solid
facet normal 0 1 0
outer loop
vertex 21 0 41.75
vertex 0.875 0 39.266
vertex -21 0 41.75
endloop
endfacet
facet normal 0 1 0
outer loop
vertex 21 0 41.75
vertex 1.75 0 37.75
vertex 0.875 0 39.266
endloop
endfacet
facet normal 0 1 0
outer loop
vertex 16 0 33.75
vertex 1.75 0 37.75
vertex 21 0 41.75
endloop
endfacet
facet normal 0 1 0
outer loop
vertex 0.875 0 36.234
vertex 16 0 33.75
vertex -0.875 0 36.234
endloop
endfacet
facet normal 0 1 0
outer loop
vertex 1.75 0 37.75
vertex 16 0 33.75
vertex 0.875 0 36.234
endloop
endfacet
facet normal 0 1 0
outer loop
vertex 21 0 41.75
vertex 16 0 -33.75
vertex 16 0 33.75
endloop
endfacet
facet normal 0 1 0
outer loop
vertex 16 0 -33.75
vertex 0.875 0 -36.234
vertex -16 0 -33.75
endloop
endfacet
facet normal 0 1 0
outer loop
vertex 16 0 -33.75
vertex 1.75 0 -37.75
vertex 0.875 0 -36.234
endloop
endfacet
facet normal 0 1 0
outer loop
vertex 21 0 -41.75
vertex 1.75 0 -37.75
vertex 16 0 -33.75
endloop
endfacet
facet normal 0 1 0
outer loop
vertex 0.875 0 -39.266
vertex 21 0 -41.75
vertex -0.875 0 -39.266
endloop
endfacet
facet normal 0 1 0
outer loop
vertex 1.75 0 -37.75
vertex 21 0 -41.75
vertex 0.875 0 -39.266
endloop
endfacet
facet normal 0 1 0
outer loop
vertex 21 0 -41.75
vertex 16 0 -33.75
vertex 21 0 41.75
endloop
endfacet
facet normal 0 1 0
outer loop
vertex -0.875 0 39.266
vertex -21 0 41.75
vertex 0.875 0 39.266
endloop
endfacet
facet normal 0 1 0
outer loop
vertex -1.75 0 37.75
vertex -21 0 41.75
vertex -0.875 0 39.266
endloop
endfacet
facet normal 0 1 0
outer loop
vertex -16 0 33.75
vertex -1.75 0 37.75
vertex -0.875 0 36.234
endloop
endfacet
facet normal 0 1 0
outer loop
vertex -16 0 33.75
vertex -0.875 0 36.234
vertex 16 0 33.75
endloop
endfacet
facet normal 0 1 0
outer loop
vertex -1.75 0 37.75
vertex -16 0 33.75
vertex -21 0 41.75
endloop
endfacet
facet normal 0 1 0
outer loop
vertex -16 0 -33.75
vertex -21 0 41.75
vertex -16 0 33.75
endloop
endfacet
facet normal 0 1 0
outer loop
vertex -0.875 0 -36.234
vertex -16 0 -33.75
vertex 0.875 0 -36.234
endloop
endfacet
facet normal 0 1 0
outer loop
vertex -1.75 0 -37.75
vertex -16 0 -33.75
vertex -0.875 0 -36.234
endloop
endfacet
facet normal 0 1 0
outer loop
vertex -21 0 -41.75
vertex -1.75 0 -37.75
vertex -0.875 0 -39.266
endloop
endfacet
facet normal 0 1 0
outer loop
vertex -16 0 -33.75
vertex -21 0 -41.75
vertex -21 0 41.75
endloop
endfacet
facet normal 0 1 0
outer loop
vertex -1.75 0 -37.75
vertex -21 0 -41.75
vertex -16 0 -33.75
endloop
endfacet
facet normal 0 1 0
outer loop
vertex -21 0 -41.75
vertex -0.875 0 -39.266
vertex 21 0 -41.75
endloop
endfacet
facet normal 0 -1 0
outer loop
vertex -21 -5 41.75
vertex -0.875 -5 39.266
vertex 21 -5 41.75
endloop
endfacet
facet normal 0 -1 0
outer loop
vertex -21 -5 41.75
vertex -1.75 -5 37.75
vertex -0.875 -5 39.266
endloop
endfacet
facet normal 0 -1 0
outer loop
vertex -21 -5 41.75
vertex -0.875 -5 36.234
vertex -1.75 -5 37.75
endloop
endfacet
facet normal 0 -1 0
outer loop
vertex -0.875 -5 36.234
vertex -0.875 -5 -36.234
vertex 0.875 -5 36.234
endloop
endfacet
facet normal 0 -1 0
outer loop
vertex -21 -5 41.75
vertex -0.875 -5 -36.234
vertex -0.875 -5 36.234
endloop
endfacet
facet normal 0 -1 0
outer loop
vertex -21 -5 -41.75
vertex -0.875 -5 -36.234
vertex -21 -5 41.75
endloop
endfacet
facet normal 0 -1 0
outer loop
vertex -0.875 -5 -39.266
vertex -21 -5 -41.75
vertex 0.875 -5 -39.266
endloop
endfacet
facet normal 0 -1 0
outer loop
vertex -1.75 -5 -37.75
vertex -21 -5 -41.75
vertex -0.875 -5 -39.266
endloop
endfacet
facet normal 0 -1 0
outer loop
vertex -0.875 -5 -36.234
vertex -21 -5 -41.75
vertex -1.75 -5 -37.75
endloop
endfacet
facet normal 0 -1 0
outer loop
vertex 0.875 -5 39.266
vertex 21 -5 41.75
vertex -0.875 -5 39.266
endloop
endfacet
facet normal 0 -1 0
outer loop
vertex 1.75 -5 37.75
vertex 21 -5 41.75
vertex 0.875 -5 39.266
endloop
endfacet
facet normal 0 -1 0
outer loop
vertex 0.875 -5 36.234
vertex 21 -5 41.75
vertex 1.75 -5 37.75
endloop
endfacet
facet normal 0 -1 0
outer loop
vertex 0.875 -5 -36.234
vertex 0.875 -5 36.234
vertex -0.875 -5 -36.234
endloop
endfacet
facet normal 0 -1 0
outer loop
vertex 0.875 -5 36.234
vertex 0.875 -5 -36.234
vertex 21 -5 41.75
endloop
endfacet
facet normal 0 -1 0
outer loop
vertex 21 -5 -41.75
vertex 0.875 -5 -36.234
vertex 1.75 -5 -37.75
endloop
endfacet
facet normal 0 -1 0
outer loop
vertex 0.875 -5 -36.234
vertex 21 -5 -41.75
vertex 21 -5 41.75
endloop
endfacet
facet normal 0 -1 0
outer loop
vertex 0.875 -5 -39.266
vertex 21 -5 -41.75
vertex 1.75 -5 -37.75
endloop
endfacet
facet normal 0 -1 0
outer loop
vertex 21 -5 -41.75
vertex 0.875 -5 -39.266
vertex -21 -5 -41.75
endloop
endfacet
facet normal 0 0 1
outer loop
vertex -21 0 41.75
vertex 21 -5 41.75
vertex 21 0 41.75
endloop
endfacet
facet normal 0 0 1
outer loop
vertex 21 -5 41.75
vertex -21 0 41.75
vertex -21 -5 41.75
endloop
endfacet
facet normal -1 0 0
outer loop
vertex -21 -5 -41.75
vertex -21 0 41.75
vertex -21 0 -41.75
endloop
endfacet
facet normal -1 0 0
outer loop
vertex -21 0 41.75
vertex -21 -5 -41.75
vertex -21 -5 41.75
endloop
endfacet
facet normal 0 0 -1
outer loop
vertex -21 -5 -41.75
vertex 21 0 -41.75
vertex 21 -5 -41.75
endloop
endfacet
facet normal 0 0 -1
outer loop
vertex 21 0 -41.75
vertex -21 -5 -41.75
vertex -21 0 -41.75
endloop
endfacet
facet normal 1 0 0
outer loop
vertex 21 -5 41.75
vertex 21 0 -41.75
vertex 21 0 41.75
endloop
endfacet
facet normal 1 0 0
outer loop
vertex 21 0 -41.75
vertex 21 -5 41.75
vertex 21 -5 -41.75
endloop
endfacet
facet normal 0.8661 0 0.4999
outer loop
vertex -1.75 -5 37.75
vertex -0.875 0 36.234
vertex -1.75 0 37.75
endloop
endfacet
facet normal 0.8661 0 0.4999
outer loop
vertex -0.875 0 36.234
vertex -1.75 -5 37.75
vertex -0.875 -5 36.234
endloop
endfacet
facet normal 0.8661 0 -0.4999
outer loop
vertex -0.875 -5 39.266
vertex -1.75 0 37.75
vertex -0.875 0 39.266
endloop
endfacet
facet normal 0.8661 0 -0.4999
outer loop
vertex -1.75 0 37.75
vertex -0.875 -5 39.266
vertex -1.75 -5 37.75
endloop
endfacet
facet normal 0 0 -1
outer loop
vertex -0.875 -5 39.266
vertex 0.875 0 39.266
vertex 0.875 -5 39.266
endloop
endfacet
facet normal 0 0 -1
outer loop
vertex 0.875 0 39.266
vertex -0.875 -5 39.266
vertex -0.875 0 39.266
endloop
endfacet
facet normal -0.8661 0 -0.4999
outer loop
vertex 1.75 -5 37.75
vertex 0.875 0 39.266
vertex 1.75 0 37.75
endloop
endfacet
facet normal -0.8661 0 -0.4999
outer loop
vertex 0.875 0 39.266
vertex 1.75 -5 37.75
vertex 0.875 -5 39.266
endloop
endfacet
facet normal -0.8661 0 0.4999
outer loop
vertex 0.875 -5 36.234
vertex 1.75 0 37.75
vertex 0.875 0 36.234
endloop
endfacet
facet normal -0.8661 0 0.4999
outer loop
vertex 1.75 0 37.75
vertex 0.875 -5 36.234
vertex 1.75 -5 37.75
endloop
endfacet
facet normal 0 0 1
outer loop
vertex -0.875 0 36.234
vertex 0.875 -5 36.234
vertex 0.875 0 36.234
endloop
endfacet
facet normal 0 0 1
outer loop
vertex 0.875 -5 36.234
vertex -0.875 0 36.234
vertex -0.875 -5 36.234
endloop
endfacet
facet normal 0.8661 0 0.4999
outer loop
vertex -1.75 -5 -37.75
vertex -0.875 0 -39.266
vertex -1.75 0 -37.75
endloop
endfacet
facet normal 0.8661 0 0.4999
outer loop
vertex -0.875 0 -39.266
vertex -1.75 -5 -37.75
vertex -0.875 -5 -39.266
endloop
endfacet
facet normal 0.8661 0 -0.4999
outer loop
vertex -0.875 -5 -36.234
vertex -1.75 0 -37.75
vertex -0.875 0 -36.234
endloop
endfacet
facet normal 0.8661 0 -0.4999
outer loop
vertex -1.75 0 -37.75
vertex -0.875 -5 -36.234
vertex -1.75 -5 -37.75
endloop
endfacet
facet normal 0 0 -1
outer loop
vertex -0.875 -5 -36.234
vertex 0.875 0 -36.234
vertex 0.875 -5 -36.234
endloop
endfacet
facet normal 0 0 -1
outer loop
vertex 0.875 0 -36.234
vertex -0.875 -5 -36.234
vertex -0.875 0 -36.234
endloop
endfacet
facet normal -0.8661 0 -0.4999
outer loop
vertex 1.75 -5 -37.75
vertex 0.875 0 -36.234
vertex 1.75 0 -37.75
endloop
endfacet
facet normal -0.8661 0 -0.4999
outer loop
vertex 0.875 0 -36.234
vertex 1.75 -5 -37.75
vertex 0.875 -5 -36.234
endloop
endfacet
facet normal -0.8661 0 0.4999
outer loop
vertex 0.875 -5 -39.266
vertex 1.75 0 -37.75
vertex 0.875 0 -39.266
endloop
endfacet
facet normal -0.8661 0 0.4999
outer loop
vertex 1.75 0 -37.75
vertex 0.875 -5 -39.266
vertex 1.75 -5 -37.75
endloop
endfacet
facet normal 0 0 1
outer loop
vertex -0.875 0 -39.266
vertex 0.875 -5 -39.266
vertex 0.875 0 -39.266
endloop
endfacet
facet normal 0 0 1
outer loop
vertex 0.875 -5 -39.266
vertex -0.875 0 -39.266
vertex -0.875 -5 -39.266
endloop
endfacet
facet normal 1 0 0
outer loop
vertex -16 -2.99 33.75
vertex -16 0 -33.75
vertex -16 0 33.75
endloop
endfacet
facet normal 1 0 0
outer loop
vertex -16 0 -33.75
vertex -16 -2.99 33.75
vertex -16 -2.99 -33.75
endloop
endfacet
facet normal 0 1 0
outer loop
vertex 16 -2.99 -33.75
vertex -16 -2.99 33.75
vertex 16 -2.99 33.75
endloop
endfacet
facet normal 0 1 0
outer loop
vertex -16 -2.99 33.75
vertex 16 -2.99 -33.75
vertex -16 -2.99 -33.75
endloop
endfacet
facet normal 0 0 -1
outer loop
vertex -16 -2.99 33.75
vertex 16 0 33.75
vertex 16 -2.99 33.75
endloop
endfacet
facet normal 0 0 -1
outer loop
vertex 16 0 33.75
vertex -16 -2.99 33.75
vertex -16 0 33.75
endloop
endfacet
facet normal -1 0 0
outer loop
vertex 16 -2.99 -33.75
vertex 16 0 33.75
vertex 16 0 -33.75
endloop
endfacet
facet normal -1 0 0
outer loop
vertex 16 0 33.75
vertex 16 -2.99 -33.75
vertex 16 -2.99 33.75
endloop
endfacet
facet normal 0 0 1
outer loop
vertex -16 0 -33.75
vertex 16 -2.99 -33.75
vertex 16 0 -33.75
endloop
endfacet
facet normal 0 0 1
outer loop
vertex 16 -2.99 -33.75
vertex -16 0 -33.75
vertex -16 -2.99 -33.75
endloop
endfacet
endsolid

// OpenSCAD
// file: common.scad
segment_width = 42;
segment_height = 83.5;

mounting_hole_centres = 75.5;
mounting_hole_diameter = 3.5;

module FrontProjection()
{
  difference()
  {
    square([segment_width, segment_height], center=true);

    for(y = [-mounting_hole_centres/2, mounting_hole_centres/2])
    {
      translate([0, y])
      {
        circle(d=mounting_hole_diameter);
      }
    }
  }
}

module Standoff(lower_diameter, upper_diameter, height)
{
  hull()
  {
    translate([0, 0, -1])
    {
      cylinder(d=lower_diameter, h=1, $fn=32);
    }

    translate([0, 0, height - 1])
    {
      cylinder(d=upper_diameter, h=1, $fn=32);
    }
  }
}
// main file
include <common.scad>

module Blank(front_thickness=5, recess_size=[segment_width - 10, segment_height - 16], recess_depth=3)
{
  color("red")
  {
    rotate([90, 0, 0])
    {
      difference()
      {
        linear_extrude(front_thickness)
        {
          FrontProjection();
        }

        translate([0, 0, -0.01])
        {
          linear_extrude(recess_depth)
          {
            square(recess_size, center=true);
          }
        }
      }
    }
  }
}

Blank();
